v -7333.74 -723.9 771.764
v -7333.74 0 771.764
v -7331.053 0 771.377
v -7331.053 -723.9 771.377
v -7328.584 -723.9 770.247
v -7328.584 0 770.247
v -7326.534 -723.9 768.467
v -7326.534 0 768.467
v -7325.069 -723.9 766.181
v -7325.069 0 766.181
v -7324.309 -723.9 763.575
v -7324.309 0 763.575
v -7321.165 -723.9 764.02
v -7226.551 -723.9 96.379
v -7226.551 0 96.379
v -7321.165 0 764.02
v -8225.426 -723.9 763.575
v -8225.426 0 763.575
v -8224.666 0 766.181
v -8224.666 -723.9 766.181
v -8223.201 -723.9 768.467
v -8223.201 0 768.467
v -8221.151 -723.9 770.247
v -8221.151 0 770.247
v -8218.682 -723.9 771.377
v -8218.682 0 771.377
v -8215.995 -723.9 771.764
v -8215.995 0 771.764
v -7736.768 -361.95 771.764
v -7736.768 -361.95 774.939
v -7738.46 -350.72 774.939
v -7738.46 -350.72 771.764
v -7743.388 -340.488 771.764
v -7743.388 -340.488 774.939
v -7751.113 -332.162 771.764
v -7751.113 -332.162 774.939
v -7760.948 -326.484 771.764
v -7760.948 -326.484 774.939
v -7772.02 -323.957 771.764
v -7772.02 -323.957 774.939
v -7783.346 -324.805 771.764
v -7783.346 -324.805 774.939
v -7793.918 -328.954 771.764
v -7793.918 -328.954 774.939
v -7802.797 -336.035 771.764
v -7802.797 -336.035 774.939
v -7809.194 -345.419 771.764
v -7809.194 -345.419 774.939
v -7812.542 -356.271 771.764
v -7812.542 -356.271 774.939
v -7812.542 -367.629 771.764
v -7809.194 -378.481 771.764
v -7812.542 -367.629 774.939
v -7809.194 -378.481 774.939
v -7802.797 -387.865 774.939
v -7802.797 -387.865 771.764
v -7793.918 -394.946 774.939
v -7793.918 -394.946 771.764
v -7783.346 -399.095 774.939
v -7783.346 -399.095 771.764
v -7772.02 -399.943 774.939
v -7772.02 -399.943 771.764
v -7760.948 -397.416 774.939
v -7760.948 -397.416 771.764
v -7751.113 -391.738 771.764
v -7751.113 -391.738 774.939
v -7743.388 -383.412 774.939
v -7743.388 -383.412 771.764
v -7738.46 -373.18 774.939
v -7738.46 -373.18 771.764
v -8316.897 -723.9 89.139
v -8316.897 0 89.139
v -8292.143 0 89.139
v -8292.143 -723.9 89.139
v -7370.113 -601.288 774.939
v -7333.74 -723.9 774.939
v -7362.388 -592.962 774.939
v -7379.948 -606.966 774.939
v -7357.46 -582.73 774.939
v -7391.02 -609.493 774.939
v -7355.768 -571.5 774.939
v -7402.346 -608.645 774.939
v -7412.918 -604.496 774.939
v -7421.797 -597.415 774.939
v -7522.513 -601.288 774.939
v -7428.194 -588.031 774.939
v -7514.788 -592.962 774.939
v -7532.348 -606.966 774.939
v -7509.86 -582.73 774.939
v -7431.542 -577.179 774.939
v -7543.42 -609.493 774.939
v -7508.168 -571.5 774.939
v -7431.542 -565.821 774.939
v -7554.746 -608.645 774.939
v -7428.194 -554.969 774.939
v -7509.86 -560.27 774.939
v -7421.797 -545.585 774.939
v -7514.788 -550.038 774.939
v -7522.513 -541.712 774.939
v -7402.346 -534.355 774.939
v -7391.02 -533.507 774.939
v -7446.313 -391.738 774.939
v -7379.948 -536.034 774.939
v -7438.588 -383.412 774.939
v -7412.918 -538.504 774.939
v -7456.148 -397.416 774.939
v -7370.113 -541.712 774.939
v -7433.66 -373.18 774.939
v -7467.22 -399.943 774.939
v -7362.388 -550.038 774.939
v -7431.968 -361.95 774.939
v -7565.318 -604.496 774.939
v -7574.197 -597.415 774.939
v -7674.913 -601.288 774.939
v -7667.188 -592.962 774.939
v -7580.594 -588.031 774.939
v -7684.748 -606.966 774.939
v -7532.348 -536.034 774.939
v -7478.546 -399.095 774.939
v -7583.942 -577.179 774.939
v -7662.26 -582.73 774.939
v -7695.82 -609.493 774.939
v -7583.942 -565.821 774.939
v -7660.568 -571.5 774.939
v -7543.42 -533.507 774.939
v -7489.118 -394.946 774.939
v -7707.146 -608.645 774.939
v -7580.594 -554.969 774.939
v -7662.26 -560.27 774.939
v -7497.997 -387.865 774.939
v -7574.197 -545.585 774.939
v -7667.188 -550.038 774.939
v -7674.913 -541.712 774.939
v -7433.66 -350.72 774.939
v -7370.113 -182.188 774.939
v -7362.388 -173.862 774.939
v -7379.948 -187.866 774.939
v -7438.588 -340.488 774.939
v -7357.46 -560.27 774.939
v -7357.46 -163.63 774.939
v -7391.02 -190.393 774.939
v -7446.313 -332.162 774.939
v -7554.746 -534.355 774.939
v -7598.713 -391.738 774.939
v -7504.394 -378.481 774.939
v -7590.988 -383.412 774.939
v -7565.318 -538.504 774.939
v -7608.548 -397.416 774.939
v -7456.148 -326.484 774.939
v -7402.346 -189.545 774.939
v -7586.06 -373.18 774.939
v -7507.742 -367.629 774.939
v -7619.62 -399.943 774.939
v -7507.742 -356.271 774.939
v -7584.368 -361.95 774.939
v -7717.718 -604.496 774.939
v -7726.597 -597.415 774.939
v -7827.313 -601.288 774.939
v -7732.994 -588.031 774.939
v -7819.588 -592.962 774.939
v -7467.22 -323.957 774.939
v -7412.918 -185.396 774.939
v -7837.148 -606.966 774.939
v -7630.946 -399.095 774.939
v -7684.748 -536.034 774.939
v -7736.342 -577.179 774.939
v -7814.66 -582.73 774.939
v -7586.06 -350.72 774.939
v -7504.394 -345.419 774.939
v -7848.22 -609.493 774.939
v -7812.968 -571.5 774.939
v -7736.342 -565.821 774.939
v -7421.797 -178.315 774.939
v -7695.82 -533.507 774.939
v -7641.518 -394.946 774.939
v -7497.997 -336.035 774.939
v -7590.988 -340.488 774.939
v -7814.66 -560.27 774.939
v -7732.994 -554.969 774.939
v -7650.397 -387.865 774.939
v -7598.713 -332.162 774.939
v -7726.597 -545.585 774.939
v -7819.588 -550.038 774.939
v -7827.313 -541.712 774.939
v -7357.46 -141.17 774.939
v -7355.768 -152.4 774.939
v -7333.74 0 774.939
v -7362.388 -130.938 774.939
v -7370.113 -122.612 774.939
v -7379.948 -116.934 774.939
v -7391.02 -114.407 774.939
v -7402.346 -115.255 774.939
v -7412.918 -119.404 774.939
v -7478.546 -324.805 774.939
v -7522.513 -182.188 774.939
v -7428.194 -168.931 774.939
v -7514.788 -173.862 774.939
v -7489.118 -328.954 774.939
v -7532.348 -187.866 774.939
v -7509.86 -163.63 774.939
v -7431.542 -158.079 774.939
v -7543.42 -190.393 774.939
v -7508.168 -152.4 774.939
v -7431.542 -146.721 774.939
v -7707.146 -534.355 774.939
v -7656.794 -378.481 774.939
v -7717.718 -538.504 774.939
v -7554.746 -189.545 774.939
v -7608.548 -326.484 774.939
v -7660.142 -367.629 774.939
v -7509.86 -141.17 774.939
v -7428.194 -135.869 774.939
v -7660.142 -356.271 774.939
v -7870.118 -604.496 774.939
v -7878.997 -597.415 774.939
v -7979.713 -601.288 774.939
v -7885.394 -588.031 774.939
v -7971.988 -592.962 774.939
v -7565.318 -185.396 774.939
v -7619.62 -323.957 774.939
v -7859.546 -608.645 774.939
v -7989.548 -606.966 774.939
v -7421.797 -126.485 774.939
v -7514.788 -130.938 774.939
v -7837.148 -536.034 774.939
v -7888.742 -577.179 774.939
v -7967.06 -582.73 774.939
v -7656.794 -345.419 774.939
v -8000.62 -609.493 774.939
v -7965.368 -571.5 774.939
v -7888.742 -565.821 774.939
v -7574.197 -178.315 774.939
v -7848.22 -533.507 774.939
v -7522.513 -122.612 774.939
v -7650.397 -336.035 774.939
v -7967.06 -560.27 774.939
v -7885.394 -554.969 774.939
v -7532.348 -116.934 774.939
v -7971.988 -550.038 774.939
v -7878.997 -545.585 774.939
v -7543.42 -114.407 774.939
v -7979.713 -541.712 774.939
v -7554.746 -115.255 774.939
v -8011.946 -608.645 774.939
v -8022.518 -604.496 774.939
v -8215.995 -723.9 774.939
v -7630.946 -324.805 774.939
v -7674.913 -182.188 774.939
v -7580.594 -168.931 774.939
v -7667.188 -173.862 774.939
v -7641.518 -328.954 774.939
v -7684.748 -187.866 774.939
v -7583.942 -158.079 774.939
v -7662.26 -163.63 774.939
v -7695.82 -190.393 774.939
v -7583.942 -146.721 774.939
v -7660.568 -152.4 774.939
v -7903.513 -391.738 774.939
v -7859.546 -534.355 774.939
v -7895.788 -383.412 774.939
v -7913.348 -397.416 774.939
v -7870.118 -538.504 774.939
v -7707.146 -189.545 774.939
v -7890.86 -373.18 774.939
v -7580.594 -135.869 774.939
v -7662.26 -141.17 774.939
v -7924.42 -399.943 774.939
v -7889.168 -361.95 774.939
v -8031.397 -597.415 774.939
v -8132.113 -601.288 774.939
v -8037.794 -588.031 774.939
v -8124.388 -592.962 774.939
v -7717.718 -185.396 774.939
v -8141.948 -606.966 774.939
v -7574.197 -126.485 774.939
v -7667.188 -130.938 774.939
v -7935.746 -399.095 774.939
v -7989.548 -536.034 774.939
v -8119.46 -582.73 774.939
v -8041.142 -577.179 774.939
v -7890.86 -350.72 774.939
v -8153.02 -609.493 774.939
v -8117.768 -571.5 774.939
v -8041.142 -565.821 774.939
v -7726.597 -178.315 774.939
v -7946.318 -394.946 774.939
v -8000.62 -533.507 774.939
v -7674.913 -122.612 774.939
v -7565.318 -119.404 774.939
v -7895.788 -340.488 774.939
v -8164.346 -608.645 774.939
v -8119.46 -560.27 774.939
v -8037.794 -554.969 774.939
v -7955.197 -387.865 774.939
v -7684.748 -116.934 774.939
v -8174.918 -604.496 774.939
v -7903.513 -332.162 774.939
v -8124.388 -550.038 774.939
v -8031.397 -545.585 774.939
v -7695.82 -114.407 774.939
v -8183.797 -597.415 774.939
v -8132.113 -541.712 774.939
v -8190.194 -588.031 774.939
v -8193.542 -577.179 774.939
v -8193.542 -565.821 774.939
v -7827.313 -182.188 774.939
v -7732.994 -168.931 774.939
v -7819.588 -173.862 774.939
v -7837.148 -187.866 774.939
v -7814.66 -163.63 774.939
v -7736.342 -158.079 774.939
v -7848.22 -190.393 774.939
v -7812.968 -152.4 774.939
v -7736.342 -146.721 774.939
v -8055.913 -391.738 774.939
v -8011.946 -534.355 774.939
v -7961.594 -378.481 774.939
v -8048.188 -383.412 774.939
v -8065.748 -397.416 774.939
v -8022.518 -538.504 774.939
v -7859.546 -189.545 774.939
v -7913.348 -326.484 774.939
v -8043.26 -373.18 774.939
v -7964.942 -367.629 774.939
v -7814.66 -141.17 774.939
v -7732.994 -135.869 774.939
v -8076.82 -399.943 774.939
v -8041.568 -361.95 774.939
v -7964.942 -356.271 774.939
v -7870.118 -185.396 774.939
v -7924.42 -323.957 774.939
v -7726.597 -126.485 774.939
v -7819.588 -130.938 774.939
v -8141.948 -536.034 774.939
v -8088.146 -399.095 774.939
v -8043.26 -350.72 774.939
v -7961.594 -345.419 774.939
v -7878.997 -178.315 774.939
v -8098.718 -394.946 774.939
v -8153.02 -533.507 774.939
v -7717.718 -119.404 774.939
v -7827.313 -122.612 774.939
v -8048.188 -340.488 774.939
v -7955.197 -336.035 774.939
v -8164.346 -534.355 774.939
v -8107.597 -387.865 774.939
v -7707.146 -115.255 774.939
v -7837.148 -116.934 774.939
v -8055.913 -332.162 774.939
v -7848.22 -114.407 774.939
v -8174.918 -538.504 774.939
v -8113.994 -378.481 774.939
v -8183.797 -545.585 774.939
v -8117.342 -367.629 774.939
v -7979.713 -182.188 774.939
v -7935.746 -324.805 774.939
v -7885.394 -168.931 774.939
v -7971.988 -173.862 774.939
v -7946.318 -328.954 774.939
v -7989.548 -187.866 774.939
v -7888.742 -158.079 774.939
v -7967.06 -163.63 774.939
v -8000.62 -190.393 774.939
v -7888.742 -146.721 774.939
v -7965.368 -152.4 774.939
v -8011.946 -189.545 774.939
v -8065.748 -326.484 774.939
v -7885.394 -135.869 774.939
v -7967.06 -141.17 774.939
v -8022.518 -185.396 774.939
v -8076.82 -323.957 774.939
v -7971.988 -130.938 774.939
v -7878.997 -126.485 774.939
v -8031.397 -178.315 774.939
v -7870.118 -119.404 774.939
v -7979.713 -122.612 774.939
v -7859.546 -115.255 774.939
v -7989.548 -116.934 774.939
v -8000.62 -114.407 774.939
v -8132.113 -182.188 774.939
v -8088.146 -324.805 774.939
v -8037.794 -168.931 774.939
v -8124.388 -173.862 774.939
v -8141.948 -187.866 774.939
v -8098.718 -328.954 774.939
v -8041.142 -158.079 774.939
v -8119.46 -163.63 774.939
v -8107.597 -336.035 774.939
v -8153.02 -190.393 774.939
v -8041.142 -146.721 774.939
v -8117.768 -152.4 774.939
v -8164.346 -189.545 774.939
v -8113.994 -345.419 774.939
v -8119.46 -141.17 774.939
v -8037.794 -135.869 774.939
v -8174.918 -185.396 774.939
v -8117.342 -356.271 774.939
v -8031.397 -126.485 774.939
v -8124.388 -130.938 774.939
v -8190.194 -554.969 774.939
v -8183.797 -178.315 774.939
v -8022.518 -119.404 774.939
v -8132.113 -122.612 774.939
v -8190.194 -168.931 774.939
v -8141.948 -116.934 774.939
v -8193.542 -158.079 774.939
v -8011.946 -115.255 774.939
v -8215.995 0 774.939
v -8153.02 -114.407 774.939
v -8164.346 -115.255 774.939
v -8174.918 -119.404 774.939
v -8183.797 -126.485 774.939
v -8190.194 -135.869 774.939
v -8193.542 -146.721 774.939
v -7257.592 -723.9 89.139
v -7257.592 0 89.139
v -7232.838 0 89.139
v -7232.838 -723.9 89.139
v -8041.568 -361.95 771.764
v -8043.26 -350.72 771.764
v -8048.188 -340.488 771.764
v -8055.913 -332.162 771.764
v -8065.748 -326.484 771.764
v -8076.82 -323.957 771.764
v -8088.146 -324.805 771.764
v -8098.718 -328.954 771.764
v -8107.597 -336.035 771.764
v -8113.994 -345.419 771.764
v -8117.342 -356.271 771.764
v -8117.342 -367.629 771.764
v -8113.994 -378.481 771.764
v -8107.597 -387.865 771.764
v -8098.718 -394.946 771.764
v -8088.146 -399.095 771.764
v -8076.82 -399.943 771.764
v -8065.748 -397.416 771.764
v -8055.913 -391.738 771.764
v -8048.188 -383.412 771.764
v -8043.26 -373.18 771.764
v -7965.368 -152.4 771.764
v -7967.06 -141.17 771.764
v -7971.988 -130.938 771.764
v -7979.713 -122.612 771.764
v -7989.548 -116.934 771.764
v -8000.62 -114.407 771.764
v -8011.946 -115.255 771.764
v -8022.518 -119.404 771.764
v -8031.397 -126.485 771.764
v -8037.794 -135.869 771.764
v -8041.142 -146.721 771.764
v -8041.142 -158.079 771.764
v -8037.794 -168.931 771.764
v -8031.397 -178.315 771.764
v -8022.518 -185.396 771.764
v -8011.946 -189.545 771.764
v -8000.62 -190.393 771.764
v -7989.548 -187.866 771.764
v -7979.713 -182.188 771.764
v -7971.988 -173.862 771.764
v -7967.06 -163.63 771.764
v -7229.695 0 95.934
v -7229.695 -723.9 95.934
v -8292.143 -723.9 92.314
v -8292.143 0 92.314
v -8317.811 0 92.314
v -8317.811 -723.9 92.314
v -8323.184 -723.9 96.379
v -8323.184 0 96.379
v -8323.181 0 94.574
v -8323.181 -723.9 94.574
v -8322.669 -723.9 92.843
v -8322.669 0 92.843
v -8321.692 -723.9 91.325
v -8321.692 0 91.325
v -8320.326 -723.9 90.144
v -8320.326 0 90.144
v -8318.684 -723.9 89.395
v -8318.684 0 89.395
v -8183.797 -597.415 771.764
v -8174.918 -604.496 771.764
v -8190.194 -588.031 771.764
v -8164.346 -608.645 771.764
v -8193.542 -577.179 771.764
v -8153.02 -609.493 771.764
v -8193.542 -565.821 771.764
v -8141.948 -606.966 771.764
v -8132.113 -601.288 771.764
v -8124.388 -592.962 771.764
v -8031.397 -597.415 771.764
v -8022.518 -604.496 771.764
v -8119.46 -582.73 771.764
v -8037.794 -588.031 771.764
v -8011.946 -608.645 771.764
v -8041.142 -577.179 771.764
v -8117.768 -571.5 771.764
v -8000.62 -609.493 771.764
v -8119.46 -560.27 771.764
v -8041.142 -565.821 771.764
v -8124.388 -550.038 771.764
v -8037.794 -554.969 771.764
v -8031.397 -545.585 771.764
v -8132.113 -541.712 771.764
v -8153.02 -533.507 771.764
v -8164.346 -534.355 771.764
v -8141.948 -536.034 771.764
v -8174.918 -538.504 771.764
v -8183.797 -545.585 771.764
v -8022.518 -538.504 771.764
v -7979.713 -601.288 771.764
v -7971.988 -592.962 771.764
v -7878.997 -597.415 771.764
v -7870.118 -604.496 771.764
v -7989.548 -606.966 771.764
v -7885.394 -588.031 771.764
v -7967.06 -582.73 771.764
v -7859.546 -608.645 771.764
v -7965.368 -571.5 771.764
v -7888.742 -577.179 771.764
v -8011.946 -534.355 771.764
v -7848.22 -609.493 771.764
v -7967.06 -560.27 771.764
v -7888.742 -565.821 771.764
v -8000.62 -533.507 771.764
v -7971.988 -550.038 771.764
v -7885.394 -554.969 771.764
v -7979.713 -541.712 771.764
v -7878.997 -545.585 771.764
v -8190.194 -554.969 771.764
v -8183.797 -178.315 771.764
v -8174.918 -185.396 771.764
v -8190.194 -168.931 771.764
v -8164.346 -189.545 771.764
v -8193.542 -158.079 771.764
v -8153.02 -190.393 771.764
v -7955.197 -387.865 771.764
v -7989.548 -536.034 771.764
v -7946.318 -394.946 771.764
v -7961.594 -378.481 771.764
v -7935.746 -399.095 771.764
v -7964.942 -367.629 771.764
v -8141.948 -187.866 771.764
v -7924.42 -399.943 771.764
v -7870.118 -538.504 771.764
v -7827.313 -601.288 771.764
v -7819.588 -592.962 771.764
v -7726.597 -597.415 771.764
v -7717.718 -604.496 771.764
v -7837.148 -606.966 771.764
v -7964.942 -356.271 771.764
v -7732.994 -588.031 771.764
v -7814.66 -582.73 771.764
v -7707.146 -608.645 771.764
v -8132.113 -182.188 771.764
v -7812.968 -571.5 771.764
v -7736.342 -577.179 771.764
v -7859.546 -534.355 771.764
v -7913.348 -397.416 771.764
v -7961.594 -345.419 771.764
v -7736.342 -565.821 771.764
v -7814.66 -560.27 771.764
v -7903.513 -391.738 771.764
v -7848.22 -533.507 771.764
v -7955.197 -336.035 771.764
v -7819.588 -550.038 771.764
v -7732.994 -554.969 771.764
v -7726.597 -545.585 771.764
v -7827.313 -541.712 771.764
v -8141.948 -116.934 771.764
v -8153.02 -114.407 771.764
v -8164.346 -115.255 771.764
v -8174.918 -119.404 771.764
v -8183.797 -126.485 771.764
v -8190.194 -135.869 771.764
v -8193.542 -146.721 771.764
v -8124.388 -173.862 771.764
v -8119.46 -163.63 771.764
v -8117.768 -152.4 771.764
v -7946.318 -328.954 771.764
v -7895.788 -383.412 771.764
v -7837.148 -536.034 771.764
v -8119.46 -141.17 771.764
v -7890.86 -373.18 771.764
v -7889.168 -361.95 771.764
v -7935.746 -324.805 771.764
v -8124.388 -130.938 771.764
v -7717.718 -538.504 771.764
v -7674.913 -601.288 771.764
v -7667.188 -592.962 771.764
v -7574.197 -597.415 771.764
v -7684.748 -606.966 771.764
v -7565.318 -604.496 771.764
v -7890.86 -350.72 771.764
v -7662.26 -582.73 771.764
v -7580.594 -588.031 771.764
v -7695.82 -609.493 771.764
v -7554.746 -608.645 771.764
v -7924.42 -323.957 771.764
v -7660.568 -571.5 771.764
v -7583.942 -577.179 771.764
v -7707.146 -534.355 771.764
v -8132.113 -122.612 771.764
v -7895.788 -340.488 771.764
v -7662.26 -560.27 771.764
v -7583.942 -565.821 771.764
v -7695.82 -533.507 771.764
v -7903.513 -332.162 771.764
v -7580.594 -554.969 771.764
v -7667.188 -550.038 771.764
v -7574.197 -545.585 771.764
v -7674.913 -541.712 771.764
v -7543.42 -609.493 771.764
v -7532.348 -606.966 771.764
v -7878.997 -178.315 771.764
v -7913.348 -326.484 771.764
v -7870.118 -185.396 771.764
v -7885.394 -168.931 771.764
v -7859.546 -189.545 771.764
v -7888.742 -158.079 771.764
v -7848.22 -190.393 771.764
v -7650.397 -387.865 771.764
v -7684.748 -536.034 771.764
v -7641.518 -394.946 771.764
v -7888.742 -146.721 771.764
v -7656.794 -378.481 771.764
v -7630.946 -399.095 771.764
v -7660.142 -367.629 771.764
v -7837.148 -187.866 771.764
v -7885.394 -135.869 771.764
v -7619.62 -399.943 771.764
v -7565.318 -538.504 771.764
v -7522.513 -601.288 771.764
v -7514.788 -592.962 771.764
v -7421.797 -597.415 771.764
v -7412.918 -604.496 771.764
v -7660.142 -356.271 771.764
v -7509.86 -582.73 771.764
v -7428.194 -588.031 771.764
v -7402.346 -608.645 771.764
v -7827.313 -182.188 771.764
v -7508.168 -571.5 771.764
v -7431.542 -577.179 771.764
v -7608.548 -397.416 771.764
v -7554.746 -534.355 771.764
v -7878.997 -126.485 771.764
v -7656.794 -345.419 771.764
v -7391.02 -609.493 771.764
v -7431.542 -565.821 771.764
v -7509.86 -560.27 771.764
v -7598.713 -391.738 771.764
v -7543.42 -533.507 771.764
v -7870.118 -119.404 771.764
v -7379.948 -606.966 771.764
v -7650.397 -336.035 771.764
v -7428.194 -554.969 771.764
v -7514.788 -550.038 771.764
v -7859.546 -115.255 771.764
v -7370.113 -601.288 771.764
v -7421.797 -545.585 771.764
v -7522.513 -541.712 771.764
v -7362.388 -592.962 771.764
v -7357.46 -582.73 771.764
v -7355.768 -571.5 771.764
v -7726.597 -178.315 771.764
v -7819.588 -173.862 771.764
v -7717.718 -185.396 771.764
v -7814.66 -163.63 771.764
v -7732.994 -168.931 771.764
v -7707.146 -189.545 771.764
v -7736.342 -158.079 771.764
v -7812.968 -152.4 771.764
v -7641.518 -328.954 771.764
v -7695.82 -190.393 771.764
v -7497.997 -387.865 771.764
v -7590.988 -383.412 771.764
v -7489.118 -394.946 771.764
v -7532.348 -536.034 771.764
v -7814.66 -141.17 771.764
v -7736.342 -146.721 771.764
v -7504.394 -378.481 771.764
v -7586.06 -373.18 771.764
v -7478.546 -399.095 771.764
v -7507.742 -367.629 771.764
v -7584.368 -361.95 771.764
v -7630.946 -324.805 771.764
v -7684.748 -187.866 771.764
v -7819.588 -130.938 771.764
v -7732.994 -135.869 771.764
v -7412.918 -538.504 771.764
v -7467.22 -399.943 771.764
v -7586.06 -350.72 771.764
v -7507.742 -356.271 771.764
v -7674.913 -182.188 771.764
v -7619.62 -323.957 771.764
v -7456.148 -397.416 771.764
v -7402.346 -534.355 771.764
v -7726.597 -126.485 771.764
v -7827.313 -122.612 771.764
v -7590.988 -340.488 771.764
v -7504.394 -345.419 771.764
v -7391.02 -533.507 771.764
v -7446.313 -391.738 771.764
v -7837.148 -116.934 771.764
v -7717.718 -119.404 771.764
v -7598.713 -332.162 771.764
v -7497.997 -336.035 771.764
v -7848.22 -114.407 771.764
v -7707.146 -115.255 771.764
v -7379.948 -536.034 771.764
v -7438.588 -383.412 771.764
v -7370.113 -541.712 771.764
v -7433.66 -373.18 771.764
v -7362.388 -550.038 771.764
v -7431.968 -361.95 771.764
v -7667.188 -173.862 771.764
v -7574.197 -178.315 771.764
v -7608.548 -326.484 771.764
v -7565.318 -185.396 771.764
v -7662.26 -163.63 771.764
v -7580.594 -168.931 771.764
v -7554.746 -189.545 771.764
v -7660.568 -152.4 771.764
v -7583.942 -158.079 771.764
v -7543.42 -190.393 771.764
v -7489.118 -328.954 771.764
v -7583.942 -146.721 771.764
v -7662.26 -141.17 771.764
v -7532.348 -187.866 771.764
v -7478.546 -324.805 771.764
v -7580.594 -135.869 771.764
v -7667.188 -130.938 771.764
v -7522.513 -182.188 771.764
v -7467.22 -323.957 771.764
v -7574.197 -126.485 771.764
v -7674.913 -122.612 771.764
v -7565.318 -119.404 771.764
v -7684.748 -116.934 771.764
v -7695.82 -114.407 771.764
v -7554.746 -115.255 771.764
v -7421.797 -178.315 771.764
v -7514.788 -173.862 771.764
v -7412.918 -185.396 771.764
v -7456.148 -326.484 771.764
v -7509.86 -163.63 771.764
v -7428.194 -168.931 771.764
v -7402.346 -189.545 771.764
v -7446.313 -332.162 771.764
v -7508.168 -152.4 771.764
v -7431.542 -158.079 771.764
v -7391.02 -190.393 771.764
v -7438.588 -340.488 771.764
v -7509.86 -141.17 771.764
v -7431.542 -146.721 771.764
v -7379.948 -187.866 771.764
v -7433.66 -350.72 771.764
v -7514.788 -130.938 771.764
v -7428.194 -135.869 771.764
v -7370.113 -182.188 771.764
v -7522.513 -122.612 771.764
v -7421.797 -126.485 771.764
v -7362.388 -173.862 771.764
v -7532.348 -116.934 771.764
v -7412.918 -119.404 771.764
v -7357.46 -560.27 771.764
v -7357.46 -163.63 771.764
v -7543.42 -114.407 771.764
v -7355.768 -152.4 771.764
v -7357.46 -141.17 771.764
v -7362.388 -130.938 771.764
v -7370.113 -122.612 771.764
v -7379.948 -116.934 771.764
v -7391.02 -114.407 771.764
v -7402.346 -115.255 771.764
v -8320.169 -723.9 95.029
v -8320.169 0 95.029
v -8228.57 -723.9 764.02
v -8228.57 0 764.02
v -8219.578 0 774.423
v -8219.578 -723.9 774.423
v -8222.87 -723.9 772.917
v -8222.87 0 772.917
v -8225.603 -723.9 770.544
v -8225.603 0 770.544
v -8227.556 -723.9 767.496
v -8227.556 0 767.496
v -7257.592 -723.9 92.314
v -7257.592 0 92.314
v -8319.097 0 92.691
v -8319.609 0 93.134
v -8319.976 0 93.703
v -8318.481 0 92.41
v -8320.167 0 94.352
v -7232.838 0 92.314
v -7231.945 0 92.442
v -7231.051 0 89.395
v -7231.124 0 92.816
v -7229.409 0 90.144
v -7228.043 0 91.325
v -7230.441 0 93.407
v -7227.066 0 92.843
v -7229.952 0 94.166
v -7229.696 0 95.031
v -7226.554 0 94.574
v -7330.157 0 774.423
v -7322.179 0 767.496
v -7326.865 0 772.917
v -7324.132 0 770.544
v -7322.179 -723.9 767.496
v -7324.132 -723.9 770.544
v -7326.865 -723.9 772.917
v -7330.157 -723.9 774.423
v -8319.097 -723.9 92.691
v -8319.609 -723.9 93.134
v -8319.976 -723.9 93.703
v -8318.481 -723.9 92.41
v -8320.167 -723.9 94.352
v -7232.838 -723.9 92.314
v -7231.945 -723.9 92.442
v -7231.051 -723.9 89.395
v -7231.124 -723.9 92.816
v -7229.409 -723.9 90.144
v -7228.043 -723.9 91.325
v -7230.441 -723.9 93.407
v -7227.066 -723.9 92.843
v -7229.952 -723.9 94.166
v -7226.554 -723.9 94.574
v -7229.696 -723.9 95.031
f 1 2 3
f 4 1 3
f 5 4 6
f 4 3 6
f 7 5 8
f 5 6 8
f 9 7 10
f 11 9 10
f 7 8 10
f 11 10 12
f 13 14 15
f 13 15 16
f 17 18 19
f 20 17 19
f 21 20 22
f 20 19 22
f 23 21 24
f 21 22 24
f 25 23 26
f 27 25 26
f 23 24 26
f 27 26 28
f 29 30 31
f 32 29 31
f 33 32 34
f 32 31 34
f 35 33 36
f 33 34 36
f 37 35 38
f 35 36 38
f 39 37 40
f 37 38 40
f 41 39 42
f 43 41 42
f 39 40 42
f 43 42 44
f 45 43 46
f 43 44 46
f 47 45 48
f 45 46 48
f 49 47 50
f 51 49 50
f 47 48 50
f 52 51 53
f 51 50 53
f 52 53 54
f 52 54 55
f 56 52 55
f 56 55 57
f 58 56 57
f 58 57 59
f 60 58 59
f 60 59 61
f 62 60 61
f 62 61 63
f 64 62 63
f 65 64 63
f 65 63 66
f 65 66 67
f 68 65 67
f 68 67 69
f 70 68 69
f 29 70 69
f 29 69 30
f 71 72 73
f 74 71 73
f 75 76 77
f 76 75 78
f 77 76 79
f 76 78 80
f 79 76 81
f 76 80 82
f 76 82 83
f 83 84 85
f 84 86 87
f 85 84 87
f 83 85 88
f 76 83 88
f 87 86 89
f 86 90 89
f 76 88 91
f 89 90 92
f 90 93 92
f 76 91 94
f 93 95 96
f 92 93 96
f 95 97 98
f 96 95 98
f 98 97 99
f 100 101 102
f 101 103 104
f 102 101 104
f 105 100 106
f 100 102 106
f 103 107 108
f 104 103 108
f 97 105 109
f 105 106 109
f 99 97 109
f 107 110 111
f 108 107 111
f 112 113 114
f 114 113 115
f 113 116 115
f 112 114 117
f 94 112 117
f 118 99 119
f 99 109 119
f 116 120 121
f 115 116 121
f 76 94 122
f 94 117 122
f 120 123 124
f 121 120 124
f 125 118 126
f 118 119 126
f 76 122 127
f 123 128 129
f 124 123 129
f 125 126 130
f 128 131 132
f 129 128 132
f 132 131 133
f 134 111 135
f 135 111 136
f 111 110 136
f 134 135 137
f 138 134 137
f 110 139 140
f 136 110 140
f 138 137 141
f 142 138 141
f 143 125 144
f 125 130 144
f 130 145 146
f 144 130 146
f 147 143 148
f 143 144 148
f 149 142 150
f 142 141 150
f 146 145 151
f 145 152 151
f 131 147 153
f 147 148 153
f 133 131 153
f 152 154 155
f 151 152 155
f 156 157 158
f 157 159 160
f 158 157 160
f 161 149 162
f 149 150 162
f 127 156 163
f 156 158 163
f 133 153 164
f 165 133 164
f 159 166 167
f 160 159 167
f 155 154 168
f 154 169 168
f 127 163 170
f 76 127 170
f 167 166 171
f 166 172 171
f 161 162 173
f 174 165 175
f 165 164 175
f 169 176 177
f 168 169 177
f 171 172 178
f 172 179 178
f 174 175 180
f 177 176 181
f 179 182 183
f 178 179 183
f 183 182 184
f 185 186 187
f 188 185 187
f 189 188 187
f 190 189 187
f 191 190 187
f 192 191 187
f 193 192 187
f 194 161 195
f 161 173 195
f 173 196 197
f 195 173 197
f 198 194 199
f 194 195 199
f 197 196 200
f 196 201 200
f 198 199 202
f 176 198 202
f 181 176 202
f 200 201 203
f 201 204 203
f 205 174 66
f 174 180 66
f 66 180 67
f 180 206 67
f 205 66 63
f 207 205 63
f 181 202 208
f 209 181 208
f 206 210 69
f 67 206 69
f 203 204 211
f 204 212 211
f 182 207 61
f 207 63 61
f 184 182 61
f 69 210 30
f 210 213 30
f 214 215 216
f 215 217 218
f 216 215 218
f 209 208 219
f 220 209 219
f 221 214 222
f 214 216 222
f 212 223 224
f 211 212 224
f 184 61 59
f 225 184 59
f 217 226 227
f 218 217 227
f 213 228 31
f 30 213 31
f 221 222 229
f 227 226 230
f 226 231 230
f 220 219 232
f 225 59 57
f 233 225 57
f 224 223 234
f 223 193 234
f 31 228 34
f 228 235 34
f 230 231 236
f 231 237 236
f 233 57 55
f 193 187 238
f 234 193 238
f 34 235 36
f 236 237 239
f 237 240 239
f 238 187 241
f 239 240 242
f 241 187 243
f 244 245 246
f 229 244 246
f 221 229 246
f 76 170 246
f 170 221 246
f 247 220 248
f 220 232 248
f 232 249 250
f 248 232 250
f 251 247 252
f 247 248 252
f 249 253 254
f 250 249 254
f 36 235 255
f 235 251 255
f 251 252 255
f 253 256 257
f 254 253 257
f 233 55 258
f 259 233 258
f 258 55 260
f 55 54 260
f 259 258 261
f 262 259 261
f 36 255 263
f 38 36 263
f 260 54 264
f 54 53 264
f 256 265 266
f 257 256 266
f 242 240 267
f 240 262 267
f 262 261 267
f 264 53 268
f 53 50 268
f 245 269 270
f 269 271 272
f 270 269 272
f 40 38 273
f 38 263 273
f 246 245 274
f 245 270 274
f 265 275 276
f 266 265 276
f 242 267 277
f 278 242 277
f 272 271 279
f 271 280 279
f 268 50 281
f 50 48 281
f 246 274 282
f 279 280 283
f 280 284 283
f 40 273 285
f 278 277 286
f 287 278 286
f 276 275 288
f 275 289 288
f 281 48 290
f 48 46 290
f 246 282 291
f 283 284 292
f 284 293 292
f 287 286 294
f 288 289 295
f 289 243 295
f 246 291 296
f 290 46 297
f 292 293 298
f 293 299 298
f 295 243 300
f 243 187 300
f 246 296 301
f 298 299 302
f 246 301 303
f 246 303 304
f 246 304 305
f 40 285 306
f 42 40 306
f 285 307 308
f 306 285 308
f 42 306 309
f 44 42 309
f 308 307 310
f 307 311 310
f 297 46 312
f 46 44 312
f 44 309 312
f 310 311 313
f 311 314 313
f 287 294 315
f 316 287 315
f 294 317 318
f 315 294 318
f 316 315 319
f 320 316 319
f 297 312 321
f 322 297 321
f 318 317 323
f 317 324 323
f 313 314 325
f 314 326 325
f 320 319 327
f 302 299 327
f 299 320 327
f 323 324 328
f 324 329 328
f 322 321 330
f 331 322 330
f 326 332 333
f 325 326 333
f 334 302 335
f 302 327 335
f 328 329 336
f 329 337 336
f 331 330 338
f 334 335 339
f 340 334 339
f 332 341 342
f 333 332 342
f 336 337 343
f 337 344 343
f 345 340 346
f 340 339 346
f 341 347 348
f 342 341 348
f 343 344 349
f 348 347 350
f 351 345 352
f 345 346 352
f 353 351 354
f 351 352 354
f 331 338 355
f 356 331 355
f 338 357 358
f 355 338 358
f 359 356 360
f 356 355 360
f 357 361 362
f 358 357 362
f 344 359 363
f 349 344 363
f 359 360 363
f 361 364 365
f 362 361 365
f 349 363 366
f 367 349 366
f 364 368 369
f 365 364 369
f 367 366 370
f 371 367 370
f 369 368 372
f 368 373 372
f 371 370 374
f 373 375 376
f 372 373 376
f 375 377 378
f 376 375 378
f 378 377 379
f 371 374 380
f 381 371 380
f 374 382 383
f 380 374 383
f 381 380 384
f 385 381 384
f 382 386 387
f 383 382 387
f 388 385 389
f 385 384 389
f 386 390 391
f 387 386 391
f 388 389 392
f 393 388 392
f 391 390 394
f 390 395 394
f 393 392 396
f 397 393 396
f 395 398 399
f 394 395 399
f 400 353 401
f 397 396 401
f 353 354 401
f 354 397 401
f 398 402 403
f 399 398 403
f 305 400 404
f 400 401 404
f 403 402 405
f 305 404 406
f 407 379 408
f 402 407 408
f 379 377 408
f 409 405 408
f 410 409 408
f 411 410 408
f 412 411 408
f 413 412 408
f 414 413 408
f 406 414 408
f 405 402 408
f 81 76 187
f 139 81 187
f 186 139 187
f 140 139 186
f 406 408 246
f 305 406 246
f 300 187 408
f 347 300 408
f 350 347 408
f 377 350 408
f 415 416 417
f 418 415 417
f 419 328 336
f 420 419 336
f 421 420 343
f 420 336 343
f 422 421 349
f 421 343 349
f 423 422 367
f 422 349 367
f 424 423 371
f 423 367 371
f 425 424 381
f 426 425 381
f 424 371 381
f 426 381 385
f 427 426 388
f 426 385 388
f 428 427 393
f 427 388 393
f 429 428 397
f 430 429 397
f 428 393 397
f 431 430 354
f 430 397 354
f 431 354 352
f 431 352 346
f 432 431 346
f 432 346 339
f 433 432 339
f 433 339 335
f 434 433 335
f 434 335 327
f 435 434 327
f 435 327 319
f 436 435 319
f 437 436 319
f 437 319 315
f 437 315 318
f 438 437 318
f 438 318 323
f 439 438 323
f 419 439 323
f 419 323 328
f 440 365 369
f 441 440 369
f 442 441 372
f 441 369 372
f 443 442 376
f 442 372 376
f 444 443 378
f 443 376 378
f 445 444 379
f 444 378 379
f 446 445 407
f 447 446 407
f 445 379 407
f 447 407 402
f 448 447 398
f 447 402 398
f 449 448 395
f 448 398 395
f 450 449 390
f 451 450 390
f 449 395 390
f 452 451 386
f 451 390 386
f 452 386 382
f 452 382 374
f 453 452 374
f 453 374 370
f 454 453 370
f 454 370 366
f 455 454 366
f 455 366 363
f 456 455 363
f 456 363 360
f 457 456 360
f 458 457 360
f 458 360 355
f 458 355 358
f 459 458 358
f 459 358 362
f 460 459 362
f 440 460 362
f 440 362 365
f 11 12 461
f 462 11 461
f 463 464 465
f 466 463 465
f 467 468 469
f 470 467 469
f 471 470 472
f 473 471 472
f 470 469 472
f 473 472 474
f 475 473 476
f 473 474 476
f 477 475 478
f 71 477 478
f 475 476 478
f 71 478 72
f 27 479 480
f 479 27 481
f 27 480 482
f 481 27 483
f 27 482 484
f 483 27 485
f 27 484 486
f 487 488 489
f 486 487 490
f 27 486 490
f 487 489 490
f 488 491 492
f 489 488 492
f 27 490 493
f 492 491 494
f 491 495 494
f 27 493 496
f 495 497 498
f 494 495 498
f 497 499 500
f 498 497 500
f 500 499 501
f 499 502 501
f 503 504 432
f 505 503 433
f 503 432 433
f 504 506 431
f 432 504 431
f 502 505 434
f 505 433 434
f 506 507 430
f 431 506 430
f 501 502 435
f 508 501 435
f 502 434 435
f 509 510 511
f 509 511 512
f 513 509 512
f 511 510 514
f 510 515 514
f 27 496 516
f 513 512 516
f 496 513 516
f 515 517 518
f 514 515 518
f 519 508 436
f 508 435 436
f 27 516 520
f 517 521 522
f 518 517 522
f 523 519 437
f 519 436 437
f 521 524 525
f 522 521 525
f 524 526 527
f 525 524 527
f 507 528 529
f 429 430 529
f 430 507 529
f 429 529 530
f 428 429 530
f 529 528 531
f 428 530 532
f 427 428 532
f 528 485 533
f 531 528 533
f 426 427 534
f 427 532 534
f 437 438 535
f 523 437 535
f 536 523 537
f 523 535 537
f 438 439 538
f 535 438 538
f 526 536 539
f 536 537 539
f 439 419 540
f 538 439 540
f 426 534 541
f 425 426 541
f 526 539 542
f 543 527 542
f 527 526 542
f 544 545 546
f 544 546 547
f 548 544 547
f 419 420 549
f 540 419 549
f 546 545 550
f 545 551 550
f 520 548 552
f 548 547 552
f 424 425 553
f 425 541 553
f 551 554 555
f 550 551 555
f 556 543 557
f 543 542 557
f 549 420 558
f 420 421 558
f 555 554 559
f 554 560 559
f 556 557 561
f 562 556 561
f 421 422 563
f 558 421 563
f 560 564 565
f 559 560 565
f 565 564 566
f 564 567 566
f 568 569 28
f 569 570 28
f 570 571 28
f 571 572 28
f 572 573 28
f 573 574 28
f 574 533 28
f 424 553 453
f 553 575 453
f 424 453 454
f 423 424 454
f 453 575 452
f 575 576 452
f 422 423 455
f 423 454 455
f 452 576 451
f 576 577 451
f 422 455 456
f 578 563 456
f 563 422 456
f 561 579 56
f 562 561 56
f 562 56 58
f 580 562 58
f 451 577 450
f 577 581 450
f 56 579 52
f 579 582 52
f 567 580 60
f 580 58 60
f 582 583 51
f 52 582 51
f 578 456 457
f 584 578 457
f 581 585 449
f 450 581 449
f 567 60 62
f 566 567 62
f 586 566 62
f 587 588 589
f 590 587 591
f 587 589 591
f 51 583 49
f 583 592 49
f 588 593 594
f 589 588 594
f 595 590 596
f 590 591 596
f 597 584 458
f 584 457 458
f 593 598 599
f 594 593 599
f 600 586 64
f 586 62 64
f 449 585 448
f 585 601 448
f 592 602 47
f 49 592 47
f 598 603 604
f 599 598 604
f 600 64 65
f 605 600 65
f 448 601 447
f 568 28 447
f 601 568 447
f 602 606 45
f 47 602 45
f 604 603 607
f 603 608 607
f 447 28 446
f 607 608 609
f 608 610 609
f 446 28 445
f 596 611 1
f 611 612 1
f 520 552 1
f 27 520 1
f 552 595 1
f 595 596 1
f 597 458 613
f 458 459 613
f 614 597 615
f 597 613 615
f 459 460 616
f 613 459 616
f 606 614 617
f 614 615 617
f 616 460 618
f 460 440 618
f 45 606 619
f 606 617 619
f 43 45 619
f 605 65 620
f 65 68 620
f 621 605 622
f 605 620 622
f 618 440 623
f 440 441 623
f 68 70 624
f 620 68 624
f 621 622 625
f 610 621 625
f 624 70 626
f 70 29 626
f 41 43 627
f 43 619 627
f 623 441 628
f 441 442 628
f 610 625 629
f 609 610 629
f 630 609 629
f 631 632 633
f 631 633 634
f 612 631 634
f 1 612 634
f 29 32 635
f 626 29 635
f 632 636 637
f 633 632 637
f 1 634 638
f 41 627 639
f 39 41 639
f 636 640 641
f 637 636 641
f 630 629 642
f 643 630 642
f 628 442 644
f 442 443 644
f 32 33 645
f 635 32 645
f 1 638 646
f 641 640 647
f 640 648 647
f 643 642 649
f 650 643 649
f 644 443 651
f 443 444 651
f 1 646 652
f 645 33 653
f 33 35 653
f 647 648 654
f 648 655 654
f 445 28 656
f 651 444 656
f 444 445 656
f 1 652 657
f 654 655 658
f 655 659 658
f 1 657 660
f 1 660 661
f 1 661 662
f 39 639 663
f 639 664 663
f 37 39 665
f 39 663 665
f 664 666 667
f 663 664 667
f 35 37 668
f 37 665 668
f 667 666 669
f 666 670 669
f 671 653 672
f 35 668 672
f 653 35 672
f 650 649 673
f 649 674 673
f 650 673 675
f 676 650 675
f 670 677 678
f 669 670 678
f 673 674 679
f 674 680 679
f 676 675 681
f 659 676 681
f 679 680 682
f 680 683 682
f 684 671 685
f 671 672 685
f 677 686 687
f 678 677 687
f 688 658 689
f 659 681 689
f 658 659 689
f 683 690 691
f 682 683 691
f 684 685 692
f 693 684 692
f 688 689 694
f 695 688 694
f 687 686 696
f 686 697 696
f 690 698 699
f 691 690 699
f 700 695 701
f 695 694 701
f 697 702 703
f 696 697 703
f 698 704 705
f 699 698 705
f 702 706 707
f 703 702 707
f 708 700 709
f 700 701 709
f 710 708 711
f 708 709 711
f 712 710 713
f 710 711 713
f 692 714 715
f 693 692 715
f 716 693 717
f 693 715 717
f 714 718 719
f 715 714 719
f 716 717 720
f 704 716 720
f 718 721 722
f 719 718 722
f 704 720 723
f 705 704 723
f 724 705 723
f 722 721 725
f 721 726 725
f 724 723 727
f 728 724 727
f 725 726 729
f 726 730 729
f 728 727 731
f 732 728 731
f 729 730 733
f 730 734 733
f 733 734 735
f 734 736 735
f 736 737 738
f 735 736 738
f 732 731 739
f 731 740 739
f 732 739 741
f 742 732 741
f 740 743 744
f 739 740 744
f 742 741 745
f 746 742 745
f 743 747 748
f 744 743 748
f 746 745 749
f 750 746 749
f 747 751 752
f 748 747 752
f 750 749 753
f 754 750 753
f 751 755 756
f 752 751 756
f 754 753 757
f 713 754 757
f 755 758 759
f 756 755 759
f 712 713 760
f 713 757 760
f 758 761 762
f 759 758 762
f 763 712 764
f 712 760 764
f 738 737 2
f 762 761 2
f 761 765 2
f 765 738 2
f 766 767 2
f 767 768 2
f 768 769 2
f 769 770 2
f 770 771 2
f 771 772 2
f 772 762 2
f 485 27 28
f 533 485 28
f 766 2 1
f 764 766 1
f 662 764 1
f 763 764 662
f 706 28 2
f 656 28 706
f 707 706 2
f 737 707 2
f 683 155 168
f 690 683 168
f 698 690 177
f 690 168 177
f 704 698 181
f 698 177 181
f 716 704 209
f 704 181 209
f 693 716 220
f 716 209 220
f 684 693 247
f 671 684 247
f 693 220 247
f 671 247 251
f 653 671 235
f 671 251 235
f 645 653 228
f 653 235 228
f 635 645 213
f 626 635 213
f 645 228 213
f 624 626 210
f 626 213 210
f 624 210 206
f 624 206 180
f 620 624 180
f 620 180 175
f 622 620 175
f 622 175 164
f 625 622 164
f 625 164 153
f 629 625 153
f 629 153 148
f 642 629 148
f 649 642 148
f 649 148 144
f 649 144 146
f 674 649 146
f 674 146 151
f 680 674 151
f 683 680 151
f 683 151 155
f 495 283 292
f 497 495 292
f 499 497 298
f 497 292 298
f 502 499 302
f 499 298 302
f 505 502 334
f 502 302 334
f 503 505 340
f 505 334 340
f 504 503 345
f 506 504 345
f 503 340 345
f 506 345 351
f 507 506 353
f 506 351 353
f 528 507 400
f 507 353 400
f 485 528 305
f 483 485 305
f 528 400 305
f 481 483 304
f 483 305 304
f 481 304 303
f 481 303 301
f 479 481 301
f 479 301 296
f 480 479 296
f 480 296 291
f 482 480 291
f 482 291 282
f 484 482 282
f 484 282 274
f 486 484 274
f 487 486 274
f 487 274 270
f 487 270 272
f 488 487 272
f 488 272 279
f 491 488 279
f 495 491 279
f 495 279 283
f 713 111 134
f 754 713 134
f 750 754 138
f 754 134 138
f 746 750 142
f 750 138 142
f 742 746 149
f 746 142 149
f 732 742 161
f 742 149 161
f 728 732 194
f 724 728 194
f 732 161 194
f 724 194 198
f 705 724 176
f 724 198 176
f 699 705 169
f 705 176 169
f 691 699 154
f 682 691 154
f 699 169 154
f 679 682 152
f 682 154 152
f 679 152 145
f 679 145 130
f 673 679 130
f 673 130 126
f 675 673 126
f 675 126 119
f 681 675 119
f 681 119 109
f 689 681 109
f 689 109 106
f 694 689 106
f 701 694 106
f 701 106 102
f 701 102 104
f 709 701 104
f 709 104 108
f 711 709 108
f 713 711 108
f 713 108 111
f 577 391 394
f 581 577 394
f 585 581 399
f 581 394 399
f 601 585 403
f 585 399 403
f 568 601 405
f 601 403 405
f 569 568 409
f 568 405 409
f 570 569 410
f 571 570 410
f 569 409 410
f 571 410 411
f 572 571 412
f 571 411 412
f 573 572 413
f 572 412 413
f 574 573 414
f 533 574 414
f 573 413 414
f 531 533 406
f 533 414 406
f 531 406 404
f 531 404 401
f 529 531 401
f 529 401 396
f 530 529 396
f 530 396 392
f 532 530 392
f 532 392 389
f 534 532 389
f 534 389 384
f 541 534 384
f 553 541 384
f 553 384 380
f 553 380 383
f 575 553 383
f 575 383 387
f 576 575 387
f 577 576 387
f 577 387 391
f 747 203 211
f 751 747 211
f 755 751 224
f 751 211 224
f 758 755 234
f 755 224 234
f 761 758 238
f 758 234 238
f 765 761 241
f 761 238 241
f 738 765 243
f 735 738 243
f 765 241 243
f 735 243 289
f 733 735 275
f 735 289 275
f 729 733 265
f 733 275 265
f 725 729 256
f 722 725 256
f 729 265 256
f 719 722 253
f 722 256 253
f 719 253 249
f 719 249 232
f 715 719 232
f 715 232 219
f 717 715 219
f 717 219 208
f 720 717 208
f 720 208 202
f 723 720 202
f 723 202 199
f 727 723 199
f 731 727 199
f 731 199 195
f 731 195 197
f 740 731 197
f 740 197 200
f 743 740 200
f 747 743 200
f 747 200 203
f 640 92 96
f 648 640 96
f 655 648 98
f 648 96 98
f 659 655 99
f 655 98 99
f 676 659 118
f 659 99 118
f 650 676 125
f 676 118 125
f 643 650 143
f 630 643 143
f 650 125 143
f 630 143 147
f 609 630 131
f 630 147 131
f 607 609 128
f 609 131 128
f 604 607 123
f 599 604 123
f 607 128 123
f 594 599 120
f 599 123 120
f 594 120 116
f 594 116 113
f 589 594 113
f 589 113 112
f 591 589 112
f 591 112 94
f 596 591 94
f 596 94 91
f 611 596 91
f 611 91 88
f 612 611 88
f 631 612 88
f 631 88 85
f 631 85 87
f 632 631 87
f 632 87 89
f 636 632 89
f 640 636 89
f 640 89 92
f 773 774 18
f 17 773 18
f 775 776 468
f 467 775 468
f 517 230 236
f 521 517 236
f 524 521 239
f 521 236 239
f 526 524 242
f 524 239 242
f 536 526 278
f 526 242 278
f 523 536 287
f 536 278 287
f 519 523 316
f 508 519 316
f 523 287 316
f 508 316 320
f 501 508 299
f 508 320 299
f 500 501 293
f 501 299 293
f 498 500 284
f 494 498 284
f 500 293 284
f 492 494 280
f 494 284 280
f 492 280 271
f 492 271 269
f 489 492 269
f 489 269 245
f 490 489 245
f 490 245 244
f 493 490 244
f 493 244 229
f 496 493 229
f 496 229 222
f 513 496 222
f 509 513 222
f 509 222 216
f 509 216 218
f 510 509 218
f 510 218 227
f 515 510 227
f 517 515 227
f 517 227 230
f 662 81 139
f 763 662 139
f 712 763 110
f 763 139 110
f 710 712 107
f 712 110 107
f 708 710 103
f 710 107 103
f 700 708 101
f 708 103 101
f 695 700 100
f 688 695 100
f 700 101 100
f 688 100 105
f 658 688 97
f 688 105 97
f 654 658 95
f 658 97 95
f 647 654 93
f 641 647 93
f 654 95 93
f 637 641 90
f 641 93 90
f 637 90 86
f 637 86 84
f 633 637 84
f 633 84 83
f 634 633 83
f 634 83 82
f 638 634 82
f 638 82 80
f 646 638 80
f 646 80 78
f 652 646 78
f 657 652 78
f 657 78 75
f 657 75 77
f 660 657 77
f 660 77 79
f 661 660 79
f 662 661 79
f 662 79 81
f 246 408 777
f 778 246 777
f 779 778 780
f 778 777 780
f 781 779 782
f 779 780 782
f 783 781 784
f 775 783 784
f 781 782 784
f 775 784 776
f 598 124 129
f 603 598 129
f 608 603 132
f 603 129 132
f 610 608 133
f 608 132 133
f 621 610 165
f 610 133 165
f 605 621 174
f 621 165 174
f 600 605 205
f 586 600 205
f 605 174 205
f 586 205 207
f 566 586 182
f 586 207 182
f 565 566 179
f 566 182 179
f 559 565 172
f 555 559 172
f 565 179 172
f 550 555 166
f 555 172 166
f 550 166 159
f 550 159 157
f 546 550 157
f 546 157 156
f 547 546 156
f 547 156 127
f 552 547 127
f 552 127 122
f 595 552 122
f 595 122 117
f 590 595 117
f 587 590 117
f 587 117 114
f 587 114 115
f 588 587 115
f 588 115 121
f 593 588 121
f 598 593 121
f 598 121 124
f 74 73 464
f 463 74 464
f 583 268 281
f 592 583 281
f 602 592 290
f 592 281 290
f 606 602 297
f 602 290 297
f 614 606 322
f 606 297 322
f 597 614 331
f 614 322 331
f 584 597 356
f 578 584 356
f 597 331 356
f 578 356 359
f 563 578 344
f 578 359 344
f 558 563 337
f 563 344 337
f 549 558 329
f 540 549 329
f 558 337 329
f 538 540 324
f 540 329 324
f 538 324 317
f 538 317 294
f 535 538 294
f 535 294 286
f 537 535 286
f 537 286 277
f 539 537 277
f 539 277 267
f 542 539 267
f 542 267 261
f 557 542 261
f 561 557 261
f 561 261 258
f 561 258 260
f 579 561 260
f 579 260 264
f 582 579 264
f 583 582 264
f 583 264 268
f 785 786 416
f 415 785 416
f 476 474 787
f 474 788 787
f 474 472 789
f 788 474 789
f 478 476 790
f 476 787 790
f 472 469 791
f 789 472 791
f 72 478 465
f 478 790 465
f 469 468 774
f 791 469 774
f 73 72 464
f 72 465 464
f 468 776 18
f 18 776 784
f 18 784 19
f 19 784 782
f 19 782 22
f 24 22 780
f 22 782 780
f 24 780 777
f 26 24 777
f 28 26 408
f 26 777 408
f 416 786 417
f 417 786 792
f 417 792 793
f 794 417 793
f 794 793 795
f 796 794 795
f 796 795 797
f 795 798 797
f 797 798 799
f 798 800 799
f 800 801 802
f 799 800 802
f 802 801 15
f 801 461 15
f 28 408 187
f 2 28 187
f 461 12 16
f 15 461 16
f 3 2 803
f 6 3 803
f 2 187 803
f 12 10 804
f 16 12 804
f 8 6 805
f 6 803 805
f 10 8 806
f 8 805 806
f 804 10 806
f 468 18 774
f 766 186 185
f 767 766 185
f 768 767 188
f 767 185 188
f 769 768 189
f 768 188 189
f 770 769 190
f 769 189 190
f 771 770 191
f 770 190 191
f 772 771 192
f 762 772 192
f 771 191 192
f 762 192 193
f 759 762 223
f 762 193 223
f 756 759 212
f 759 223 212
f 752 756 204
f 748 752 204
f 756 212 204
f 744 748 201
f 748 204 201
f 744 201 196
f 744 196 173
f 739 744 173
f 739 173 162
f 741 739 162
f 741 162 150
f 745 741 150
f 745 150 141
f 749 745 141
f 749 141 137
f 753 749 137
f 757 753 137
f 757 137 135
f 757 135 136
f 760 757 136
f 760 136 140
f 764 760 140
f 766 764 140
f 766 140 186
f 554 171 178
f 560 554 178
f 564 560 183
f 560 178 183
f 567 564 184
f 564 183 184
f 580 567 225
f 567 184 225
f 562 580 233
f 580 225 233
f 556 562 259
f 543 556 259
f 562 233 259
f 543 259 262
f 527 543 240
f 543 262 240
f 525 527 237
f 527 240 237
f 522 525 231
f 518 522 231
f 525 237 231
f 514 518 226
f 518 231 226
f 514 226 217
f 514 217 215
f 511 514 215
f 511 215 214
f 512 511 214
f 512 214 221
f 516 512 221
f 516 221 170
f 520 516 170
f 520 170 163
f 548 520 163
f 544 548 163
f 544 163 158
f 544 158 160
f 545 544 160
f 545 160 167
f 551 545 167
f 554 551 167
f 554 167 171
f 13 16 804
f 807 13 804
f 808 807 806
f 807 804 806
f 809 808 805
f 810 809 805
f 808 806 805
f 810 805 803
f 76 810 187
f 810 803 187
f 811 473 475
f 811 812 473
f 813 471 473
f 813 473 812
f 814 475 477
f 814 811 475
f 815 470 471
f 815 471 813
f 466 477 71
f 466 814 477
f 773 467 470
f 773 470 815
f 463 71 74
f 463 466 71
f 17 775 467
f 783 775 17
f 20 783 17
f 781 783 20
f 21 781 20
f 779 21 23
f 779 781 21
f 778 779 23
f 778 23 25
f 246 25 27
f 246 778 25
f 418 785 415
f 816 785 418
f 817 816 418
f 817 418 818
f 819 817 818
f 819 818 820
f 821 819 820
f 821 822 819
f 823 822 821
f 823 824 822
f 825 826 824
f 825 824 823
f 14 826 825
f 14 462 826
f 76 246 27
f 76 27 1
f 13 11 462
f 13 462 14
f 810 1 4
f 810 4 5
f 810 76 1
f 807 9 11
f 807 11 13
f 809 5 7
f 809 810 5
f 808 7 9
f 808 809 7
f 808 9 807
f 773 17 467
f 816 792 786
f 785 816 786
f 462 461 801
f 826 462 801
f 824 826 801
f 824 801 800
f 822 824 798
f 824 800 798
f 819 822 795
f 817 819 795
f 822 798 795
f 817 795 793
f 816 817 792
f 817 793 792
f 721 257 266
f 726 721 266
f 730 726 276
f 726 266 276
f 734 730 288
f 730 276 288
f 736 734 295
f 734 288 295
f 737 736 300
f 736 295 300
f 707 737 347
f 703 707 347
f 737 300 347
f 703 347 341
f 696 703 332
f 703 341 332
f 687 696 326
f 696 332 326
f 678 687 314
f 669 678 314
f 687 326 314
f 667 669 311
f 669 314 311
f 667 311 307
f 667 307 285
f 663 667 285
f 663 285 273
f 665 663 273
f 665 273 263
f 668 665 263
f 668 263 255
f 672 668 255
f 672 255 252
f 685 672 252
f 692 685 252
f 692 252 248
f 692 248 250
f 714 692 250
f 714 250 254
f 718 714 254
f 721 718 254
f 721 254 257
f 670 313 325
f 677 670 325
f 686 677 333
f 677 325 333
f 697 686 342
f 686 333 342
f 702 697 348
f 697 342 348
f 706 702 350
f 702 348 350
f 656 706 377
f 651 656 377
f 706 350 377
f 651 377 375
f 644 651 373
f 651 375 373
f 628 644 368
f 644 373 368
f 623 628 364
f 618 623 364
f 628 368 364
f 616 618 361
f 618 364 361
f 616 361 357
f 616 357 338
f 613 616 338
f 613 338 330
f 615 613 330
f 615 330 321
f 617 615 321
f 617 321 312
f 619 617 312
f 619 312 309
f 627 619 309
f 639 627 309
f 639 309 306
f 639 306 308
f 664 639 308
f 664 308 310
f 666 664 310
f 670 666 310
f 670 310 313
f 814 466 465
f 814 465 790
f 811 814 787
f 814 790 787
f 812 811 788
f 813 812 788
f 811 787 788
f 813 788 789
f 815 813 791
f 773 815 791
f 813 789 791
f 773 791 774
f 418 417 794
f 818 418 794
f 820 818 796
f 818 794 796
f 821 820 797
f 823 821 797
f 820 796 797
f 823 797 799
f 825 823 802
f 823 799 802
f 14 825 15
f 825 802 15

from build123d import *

# Parameters (mm, degrees)
F1_DEPTH = 723.9
F2_R     = 38.1
F3_DEPTH = 25.4


# Not quite as in the source:
# - ends of sketch curves that miss each other by under 0.0002 mm in the source are joined


with BuildPart() as f1:
    # F0 (on Front) → F1 (new body)
    with BuildSketch(Plane.XZ):
        with BuildLine():
            ThreePointArc((-8215.9952266, 774.938506), (-8224.3216631827, 771.8281073386), (-8228.56958997, 764.0204672337))
            Line((-8228.56958997, 764.0204672337), (-8323.1839632, 96.3794872))
            ThreePointArc((-8323.1839632, 96.3794872), (-8321.6915780693, 91.3252877086), (-8316.8967774, 89.138506))
            Line((-8316.8967774, 89.138506), (-8292.1428772, 89.138506))
            Line((-8292.1428772, 89.138506), (-8292.1428772, 92.313506))
            Line((-8292.1428772, 92.313506), (-8317.8109488, 92.313506))
            ThreePointArc((-8317.8109488, 92.313506), (-8319.6089965519, 93.1335462625), (-8320.1686430016, 95.0288661831))
            Line((-8320.1686430016, 95.0288661831), (-8225.4259926, 763.5749778))
            ThreePointArc((-8225.4259926, 763.5749778), (-8222.2400533643, 769.4307075881), (-8215.9952266, 771.763506))
            Line((-8215.9952266, 771.763506), (-7333.739841, 771.763506))
            ThreePointArc((-7333.739841, 771.763506), (-7327.4950142357, 769.4307075881), (-7324.3090687225, 763.5749786896))
            Line((-7324.3090687225, 763.5749786896), (-7229.6946846, 95.9339966))
            ThreePointArc((-7229.6946846, 95.9339966), (-7230.4408638812, 93.4068975271), (-7232.8382648, 92.313506))
            Line((-7232.8382648, 92.313506), (-7257.592165, 92.313506))
            Line((-7257.592165, 92.313506), (-7257.592165, 89.138506))
            Line((-7257.592165, 89.138506), (-7232.8382648, 89.138506))
            ThreePointArc((-7232.8382648, 89.138506), (-7228.0434641307, 91.3252877086), (-7226.551083115, 96.3794866168))
            Line((-7226.551083115, 96.3794866168), (-7321.1654694, 764.0204684))
            ThreePointArc((-7321.1654694, 764.0204684), (-7325.4134044173, 771.8281073386), (-7333.739841, 774.938506))
            Line((-7333.739841, 774.938506), (-8215.9952266, 774.938506))
        make_face()
    extrude(amount=F1_DEPTH)

    # F2 (on face) → F3 (cut)
    with BuildSketch(Plane.XY.offset(774.938506)):
        with Locations((-8155.8675338, -152.4)):
            Circle(F2_R)
        with Locations((-8003.4675338, -152.4)):
            Circle(F2_R)
        with Locations((-7851.0675338, -152.4)):
            Circle(F2_R)
        with Locations((-7698.6675338, -152.4)):
            Circle(F2_R)
        with Locations((-7546.2675338, -152.4)):
            Circle(F2_R)
        with Locations((-7393.8675338, -152.4)):
            Circle(F2_R)
        with Locations((-8079.6675338, -361.95)):
            Circle(F2_R)
        with Locations((-7927.2675338, -361.95)):
            Circle(F2_R)
        with Locations((-7774.8675338, -361.95)):
            Circle(F2_R)
        with Locations((-7622.4675338, -361.95)):
            Circle(F2_R)
        with Locations((-7470.0675338, -361.95)):
            Circle(F2_R)
        with Locations((-8155.8675338, -571.5)):
            Circle(F2_R)
        with Locations((-8003.4675338, -571.5)):
            Circle(F2_R)
        with Locations((-7851.0675338, -571.5)):
            Circle(F2_R)
        with Locations((-7698.6675338, -571.5)):
            Circle(F2_R)
        with Locations((-7546.2675338, -571.5)):
            Circle(F2_R)
        with Locations((-7393.8675338, -571.5)):
            Circle(F2_R)
    extrude(amount=-F3_DEPTH, mode=Mode.SUBTRACT)


solid = f1.part
